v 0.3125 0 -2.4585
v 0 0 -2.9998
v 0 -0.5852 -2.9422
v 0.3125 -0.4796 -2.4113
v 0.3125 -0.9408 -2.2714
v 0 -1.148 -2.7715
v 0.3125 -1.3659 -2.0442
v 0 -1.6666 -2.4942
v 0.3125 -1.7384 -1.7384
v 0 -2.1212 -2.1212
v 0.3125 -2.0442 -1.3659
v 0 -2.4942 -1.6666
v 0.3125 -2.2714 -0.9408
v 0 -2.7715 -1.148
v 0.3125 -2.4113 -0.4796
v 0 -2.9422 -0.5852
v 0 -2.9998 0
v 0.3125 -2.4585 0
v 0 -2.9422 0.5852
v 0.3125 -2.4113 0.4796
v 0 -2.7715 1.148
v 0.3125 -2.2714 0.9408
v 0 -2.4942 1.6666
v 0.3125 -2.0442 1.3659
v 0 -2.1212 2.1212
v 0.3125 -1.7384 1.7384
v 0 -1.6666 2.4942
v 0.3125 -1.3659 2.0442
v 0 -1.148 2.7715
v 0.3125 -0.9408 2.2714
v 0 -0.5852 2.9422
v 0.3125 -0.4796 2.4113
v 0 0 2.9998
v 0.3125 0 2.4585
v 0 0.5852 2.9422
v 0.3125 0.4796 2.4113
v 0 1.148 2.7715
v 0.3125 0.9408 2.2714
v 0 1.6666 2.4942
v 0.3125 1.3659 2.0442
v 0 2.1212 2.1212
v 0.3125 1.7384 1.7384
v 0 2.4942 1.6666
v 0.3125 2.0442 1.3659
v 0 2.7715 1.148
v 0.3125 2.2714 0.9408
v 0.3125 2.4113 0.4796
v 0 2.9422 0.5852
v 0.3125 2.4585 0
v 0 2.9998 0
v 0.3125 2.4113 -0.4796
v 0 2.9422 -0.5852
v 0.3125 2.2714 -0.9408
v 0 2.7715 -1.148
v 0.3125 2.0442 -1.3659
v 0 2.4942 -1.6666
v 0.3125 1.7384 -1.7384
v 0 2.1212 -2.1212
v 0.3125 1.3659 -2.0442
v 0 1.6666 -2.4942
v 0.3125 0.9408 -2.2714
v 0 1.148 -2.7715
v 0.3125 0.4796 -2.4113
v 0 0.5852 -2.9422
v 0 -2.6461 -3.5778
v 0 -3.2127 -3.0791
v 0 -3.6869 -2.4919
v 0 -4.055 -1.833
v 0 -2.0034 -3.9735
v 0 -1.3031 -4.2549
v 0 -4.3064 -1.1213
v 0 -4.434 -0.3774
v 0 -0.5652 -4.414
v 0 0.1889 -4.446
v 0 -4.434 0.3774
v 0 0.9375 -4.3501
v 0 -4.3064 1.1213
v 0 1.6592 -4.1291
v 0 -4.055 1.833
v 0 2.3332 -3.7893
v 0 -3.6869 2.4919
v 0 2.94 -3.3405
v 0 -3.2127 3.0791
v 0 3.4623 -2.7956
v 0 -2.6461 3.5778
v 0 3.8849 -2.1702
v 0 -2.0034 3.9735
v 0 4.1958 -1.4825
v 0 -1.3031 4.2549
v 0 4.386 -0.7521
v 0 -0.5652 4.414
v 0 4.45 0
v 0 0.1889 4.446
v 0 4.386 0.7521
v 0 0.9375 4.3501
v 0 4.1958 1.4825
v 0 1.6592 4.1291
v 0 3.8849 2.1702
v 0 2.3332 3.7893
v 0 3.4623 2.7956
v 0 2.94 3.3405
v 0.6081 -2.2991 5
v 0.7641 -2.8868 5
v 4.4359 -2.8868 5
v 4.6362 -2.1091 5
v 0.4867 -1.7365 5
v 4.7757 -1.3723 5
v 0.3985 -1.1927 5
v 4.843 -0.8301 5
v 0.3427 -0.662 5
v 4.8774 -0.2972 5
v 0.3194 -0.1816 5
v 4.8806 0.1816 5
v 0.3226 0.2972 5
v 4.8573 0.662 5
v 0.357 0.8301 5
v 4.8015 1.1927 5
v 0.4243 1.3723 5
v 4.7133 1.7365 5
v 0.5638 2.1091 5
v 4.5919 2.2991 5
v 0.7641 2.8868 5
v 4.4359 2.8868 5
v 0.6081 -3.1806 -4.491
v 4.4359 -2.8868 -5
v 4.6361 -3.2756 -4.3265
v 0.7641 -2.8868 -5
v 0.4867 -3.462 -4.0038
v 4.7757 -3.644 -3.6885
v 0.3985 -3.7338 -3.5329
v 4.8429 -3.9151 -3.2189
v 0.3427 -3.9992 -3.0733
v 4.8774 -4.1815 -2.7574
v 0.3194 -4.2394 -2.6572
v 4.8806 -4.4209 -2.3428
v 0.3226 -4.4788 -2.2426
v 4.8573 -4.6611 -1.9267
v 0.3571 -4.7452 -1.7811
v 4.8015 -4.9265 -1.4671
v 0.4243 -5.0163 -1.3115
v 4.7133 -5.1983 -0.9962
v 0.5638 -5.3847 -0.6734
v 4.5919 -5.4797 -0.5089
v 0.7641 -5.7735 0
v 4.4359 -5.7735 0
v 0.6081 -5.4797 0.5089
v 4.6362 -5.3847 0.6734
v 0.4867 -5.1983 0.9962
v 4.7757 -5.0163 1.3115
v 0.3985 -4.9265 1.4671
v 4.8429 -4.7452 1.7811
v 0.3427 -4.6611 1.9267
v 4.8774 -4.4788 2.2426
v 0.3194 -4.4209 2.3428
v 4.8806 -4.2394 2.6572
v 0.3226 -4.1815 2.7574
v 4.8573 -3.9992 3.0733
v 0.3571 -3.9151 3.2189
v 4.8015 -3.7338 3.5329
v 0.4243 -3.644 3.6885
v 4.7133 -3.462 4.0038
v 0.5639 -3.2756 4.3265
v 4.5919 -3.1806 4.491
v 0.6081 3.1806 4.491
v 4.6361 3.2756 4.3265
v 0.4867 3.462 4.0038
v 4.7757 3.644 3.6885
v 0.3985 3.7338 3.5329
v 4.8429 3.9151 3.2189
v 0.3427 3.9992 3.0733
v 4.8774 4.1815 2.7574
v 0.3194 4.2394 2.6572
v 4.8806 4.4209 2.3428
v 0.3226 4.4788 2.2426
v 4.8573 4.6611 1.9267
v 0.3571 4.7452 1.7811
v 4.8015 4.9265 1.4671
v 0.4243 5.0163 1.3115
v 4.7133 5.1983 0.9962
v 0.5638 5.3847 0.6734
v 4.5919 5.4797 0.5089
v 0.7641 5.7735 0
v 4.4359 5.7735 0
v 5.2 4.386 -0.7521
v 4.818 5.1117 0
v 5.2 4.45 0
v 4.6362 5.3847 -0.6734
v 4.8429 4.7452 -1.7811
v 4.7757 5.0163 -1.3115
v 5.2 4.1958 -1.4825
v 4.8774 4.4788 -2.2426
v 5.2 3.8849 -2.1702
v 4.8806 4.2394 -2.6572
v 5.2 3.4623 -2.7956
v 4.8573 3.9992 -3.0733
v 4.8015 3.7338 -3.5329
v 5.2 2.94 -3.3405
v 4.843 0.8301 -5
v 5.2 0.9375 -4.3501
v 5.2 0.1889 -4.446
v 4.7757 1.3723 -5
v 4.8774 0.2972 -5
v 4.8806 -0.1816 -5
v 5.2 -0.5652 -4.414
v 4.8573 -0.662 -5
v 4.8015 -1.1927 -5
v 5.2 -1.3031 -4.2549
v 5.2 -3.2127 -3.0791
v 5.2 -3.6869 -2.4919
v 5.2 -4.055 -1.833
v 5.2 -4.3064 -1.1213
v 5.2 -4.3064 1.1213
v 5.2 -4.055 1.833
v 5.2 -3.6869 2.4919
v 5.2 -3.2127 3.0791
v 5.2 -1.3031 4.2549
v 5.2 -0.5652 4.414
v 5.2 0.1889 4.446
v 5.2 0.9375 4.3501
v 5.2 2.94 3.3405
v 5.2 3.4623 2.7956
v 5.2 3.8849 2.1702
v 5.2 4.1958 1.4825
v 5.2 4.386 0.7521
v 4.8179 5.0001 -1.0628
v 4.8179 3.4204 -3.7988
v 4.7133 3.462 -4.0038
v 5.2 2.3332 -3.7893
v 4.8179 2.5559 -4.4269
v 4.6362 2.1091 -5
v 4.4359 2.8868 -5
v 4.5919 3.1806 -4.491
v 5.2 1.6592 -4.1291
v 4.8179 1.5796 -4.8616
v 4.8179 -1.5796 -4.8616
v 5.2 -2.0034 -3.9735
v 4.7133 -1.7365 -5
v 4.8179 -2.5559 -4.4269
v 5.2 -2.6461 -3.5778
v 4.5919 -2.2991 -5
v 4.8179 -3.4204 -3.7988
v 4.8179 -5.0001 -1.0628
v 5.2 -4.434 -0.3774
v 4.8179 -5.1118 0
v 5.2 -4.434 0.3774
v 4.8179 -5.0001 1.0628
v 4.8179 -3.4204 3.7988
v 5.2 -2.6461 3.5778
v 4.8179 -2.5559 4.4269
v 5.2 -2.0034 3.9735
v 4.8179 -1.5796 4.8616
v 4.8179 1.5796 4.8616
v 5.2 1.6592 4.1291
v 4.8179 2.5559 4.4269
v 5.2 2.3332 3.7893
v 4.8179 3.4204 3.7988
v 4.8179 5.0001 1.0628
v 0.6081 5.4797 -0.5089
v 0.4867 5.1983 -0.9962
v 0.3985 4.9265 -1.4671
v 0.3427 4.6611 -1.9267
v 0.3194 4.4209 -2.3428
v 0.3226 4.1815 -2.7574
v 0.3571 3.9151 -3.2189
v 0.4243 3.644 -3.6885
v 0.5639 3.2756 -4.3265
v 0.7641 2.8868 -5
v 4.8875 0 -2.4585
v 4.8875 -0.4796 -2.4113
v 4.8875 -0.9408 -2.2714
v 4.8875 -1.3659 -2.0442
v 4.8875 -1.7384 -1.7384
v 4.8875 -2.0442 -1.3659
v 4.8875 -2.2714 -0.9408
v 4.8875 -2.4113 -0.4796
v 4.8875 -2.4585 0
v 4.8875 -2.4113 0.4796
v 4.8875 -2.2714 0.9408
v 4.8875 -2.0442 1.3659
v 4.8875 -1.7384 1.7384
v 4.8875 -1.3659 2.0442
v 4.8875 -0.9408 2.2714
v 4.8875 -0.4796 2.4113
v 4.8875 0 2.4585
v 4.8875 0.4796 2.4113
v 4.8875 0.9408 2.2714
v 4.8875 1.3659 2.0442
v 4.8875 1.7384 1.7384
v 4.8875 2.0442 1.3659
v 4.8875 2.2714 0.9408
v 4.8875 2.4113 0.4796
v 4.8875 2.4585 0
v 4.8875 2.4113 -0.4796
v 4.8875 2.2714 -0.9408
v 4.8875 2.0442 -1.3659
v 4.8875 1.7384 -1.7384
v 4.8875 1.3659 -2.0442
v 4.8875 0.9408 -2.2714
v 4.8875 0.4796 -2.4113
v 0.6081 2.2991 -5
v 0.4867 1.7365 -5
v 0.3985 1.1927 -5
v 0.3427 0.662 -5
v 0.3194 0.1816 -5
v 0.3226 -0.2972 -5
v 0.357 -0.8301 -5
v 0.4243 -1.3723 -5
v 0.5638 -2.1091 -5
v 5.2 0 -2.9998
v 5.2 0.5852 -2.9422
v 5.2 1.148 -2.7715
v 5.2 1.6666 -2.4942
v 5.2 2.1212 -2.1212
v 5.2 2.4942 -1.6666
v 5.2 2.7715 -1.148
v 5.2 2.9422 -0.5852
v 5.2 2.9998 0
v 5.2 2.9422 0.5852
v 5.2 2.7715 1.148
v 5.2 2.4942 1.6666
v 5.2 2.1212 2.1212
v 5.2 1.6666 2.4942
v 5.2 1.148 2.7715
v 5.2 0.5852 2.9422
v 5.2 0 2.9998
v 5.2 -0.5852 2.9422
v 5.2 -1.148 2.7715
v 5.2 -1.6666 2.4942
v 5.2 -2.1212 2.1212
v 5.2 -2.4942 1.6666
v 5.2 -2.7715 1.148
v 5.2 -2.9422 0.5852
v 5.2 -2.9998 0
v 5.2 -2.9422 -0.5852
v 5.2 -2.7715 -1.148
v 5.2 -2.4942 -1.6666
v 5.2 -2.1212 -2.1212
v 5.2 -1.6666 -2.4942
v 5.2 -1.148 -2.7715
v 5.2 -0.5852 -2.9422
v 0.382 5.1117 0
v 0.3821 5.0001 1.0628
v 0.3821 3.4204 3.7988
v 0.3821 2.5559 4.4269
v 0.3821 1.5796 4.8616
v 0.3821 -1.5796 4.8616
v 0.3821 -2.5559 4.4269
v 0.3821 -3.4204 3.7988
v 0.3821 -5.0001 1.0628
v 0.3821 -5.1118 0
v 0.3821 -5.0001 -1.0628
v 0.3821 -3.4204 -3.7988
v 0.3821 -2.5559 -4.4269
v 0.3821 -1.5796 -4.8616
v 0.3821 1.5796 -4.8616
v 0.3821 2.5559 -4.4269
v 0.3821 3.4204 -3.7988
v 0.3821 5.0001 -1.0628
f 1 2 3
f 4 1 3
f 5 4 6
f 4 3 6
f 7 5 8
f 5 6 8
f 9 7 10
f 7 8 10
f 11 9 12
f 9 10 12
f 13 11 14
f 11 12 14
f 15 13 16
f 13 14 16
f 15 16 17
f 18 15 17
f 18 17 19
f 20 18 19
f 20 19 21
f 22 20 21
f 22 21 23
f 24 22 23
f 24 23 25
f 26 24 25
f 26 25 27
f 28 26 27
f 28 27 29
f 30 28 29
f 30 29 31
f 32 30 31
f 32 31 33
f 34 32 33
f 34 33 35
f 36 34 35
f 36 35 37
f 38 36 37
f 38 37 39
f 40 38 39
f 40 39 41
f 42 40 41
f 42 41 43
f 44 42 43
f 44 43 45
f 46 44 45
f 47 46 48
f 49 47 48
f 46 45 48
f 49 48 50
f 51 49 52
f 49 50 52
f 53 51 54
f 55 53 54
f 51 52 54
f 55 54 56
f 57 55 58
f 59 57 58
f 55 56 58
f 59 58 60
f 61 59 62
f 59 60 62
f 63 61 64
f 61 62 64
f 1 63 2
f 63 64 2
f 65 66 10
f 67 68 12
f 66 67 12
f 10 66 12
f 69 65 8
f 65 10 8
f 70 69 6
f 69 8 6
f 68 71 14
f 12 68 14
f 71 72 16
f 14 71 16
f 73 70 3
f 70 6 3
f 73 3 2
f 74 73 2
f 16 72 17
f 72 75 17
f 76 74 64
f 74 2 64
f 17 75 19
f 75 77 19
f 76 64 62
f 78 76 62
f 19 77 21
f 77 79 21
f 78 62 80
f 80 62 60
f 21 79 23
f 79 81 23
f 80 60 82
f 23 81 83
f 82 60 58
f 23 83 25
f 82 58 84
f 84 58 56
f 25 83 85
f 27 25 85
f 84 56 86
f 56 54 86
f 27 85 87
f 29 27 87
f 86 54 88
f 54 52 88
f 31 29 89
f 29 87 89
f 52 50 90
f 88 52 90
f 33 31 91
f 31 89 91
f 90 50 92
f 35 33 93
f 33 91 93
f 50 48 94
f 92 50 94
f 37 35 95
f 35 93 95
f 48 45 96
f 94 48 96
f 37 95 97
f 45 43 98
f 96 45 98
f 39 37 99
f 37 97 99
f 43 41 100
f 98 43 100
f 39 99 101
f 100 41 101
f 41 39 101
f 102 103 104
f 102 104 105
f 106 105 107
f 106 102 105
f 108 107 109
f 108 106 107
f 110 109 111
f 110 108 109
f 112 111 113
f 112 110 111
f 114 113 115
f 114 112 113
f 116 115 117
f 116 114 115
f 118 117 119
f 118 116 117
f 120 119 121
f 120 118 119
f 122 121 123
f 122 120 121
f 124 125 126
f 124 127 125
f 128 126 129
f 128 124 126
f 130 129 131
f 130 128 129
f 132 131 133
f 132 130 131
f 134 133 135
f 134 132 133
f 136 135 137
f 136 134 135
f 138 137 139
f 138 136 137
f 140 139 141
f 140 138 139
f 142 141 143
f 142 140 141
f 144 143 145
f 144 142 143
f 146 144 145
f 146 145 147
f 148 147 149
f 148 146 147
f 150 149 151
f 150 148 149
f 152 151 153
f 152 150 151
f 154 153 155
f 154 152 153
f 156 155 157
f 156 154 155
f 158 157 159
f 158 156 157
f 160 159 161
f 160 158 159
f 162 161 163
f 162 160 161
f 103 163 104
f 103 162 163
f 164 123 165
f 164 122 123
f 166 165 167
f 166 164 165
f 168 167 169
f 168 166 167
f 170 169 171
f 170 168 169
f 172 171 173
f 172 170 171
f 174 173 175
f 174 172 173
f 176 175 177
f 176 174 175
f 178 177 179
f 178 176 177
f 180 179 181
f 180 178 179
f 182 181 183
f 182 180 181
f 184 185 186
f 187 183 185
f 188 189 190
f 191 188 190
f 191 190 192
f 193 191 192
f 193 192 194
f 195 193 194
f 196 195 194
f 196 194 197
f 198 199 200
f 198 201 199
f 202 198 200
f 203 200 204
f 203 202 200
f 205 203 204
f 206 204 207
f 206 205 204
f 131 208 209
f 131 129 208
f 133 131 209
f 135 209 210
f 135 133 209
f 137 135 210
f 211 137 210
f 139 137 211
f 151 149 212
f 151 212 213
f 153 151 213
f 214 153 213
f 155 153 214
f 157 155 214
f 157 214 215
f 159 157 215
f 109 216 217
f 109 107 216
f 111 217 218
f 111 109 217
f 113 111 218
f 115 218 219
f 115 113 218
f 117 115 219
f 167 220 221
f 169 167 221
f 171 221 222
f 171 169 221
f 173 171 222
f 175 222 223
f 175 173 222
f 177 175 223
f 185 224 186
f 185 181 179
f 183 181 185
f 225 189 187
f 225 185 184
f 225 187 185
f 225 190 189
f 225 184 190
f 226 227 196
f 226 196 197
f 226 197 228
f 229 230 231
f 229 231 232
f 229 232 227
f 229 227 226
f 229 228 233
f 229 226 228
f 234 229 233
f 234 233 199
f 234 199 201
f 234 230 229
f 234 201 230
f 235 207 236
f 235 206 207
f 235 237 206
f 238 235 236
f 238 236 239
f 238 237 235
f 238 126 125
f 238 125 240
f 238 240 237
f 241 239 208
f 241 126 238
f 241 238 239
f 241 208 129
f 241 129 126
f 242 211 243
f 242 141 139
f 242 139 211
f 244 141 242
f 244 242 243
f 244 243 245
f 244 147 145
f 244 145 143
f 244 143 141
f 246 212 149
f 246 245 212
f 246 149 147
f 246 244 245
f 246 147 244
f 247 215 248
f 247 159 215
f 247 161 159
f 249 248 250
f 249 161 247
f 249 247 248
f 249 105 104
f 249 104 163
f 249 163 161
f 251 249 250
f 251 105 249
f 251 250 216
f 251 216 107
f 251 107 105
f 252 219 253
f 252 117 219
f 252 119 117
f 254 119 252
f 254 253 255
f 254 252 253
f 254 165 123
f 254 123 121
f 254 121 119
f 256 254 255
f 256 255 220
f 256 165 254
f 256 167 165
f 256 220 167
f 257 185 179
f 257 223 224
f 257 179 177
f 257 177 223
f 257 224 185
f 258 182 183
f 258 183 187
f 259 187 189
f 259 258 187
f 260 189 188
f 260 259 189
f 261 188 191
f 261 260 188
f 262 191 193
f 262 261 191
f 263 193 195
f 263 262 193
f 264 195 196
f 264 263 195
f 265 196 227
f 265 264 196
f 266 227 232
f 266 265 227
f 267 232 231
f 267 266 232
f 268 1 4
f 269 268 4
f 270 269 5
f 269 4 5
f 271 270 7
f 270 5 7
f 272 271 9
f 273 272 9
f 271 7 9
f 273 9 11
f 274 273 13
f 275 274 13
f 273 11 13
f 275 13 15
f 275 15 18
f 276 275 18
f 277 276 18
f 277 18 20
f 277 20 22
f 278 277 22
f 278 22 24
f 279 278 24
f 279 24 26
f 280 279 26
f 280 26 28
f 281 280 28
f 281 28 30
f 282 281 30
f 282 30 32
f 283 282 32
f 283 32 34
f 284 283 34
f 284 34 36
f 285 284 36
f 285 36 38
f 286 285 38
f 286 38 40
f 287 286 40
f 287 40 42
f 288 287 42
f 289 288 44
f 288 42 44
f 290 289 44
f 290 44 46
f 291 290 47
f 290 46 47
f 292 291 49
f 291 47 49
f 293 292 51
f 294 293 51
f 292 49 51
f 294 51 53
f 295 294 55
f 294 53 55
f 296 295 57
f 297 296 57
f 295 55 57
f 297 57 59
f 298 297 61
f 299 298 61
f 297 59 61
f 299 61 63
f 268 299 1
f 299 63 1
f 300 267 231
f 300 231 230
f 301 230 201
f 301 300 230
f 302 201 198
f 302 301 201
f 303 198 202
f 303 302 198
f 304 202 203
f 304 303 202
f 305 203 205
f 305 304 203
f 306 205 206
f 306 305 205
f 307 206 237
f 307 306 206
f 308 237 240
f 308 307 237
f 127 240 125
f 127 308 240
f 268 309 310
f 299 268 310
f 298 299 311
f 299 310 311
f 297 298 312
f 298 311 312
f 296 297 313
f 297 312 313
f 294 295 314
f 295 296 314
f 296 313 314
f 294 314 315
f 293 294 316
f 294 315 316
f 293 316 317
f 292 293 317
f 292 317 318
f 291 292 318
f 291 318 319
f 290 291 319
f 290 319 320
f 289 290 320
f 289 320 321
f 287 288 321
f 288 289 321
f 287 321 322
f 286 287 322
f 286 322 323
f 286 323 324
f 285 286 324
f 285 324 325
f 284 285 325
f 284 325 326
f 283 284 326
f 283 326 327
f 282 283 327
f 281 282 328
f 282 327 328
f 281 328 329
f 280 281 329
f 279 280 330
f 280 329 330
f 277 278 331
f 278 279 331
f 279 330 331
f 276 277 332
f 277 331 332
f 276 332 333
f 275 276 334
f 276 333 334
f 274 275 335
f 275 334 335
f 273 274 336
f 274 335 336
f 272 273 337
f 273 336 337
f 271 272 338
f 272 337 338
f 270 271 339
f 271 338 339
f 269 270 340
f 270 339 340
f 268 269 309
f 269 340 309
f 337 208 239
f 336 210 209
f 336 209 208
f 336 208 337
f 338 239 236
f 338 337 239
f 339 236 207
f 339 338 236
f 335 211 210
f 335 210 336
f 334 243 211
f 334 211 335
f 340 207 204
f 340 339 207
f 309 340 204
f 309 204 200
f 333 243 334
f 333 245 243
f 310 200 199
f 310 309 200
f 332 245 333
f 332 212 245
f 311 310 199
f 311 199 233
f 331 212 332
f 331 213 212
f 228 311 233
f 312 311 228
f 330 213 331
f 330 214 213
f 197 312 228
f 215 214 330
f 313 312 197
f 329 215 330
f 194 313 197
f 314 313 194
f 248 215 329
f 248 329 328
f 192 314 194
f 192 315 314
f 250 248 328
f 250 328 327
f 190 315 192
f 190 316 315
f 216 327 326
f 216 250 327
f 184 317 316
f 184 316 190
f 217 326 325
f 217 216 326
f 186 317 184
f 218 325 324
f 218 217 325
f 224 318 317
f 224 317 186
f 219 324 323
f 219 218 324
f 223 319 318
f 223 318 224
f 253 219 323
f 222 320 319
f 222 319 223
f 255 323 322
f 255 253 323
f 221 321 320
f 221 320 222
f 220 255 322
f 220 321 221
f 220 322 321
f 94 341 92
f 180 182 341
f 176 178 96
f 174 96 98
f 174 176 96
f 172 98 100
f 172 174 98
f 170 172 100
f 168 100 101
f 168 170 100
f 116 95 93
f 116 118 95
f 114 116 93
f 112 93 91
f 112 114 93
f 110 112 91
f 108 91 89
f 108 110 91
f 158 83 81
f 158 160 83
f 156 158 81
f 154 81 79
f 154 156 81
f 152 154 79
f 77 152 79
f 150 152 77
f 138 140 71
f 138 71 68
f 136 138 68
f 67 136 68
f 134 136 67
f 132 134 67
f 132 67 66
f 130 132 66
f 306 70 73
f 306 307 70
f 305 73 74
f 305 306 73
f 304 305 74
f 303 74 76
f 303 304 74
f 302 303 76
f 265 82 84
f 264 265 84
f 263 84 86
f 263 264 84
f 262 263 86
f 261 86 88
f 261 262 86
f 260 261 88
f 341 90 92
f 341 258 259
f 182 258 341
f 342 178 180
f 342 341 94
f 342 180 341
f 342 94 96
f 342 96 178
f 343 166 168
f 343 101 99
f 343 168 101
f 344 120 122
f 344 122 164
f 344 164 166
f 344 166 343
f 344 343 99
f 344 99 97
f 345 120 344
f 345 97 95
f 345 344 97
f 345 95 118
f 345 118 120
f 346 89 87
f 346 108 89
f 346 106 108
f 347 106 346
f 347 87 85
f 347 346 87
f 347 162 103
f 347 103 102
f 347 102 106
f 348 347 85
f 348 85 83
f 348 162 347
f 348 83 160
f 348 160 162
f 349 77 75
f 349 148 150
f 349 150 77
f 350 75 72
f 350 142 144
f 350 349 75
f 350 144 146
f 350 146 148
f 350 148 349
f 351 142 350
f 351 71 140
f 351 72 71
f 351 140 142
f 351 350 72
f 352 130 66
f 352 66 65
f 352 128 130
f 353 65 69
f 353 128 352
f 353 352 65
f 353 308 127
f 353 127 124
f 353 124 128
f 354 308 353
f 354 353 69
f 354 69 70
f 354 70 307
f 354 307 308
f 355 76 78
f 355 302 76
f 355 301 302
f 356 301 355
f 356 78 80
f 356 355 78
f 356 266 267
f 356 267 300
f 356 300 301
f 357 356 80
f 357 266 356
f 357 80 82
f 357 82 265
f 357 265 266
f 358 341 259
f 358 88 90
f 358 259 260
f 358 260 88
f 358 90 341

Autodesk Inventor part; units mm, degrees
ref_plane "YZ Plane" through (0, 0, 0) normal (1, 0, 0) x (0, 1, 0)
ref_plane "XZ Plane" through (0, 0, 0) normal (0, 1, 0) x (-1, 0, 0)
sketch "Szkic1" plane through (0, 0, 0) normal (1, 0, 0) x (0, 1, 0)
  line L0 (-5.7735, 0) -> (-2.8868, 5)
  line L1 (-2.8868, 5) -> (2.8868, 5)
  line L2 (2.8868, 5) -> (5.7735, 0)
  line L3 (5.7735, 0) -> (2.8868, -5)
  line L4 (2.8868, -5) -> (-2.8868, -5)
  line L5 (-2.8868, -5) -> (-5.7735, 0)
  point P0 (0, 0)
  point P1 (0, 0)
  dimension "d0" = 11.547
extrude "Bryła" add sketch "Szkic1" along normal blind 5.2
sketch "Szkic2" plane through (0, 0, 0) normal (0, 0, 1) x (1, 0, 0)
  line L0 (0, 2.8868) -> (0, 5.7735) projected
  line L1 (0, 5.7735) -> (5.2, 5.7735) projected
  line L2 (5.2, 2.8868) -> (5.2, 5.7735) projected
  line L3 (-1.04, 0) -> (6.24, 0) projected
  line L4 (0.7641, 5.7735) -> (0, 4.45)
  line L5 (4.4359, 5.7735) -> (5.2, 4.45)
  dimension "d3" = 30
  dimension "d4" = 30
  dimension "d5" = 8.9
  dimension "d6" = 8.9
revolve "Faza1" cut sketch "Szkic2" angle 360 about axis through (-10, 0, 0) along (1, 0, 0)
sketch "Szkic3" plane through (5.2, 0, 0) normal (1, 0, 0) x (0, 0, -1)
  arc A0 (-0.625, -1.0825) -> (0.625, -1.0825) centre (0, 0) ccw projected
hole "Gwint" at (5.2, 0, 0) direction (-1, 0, 0) diameter 4.917 end through all thread size "M6x1" class "6H" standard "ISO Metric profile"
chamfer "Faza2" distance 0.5413 angle 30 1 edges at (5.2, 0, 2.4585) measured on face at (5.2, 3.7371, -0.4538)
chamfer "Faza3" distance 0.5413 angle 30 1 edges at (0, 0, 2.4585) measured on face at (0, 3.7371, -0.4538)
ref_plane "Work Plane1" through (-10.9812, 0, 0) normal (0, -0.8660254, -0.5) x (1, 0, 0)
equation "\"d0\" = 1.1547 * SW"
equation "\"d1\" = KOH"
equation "\"d8\" = -0.5 * GD1 + 0.5 * NND"
equation "\"d40\" = -0.5 * GD1 + 0.5 * NND"
equation "\"d10\" = -0.5 * GD1 + 0.5 * NND"
equation "\"d41\" = -0.5 * GD1 + 0.5 * NND"
equation "\"d3\" = ANG1"
equation "\"d4\" = ANG2"
equation "\"d5\" = SW0"
equation "\"d6\" = SW01"
equation "\"ANG1\" = 30deg"
equation "\"ANG2\" = 30deg"
equation "\"NND\" = 6"
equation "\"KOH\" = 5.2"
equation "\"SW0\" = 8.9"
equation "\"SW01\" = 8.9"
equation "\"GUL\" = 0.541266 * PTC"
equation "\"THREADDIA\" = 6"
equation "\"TOA\" = 30deg"
equation "\"PTC\" = 1"
equation "\"E0\" = 1.155 * SW"
equation "\"GAL\" = 0.541266 * PTC"
equation "\"SW\" = 10"
equation "\"GD1\" = 4.917468"
properties part number "ISO 4032 - M6" material "Stal nierdzewna 440C"
